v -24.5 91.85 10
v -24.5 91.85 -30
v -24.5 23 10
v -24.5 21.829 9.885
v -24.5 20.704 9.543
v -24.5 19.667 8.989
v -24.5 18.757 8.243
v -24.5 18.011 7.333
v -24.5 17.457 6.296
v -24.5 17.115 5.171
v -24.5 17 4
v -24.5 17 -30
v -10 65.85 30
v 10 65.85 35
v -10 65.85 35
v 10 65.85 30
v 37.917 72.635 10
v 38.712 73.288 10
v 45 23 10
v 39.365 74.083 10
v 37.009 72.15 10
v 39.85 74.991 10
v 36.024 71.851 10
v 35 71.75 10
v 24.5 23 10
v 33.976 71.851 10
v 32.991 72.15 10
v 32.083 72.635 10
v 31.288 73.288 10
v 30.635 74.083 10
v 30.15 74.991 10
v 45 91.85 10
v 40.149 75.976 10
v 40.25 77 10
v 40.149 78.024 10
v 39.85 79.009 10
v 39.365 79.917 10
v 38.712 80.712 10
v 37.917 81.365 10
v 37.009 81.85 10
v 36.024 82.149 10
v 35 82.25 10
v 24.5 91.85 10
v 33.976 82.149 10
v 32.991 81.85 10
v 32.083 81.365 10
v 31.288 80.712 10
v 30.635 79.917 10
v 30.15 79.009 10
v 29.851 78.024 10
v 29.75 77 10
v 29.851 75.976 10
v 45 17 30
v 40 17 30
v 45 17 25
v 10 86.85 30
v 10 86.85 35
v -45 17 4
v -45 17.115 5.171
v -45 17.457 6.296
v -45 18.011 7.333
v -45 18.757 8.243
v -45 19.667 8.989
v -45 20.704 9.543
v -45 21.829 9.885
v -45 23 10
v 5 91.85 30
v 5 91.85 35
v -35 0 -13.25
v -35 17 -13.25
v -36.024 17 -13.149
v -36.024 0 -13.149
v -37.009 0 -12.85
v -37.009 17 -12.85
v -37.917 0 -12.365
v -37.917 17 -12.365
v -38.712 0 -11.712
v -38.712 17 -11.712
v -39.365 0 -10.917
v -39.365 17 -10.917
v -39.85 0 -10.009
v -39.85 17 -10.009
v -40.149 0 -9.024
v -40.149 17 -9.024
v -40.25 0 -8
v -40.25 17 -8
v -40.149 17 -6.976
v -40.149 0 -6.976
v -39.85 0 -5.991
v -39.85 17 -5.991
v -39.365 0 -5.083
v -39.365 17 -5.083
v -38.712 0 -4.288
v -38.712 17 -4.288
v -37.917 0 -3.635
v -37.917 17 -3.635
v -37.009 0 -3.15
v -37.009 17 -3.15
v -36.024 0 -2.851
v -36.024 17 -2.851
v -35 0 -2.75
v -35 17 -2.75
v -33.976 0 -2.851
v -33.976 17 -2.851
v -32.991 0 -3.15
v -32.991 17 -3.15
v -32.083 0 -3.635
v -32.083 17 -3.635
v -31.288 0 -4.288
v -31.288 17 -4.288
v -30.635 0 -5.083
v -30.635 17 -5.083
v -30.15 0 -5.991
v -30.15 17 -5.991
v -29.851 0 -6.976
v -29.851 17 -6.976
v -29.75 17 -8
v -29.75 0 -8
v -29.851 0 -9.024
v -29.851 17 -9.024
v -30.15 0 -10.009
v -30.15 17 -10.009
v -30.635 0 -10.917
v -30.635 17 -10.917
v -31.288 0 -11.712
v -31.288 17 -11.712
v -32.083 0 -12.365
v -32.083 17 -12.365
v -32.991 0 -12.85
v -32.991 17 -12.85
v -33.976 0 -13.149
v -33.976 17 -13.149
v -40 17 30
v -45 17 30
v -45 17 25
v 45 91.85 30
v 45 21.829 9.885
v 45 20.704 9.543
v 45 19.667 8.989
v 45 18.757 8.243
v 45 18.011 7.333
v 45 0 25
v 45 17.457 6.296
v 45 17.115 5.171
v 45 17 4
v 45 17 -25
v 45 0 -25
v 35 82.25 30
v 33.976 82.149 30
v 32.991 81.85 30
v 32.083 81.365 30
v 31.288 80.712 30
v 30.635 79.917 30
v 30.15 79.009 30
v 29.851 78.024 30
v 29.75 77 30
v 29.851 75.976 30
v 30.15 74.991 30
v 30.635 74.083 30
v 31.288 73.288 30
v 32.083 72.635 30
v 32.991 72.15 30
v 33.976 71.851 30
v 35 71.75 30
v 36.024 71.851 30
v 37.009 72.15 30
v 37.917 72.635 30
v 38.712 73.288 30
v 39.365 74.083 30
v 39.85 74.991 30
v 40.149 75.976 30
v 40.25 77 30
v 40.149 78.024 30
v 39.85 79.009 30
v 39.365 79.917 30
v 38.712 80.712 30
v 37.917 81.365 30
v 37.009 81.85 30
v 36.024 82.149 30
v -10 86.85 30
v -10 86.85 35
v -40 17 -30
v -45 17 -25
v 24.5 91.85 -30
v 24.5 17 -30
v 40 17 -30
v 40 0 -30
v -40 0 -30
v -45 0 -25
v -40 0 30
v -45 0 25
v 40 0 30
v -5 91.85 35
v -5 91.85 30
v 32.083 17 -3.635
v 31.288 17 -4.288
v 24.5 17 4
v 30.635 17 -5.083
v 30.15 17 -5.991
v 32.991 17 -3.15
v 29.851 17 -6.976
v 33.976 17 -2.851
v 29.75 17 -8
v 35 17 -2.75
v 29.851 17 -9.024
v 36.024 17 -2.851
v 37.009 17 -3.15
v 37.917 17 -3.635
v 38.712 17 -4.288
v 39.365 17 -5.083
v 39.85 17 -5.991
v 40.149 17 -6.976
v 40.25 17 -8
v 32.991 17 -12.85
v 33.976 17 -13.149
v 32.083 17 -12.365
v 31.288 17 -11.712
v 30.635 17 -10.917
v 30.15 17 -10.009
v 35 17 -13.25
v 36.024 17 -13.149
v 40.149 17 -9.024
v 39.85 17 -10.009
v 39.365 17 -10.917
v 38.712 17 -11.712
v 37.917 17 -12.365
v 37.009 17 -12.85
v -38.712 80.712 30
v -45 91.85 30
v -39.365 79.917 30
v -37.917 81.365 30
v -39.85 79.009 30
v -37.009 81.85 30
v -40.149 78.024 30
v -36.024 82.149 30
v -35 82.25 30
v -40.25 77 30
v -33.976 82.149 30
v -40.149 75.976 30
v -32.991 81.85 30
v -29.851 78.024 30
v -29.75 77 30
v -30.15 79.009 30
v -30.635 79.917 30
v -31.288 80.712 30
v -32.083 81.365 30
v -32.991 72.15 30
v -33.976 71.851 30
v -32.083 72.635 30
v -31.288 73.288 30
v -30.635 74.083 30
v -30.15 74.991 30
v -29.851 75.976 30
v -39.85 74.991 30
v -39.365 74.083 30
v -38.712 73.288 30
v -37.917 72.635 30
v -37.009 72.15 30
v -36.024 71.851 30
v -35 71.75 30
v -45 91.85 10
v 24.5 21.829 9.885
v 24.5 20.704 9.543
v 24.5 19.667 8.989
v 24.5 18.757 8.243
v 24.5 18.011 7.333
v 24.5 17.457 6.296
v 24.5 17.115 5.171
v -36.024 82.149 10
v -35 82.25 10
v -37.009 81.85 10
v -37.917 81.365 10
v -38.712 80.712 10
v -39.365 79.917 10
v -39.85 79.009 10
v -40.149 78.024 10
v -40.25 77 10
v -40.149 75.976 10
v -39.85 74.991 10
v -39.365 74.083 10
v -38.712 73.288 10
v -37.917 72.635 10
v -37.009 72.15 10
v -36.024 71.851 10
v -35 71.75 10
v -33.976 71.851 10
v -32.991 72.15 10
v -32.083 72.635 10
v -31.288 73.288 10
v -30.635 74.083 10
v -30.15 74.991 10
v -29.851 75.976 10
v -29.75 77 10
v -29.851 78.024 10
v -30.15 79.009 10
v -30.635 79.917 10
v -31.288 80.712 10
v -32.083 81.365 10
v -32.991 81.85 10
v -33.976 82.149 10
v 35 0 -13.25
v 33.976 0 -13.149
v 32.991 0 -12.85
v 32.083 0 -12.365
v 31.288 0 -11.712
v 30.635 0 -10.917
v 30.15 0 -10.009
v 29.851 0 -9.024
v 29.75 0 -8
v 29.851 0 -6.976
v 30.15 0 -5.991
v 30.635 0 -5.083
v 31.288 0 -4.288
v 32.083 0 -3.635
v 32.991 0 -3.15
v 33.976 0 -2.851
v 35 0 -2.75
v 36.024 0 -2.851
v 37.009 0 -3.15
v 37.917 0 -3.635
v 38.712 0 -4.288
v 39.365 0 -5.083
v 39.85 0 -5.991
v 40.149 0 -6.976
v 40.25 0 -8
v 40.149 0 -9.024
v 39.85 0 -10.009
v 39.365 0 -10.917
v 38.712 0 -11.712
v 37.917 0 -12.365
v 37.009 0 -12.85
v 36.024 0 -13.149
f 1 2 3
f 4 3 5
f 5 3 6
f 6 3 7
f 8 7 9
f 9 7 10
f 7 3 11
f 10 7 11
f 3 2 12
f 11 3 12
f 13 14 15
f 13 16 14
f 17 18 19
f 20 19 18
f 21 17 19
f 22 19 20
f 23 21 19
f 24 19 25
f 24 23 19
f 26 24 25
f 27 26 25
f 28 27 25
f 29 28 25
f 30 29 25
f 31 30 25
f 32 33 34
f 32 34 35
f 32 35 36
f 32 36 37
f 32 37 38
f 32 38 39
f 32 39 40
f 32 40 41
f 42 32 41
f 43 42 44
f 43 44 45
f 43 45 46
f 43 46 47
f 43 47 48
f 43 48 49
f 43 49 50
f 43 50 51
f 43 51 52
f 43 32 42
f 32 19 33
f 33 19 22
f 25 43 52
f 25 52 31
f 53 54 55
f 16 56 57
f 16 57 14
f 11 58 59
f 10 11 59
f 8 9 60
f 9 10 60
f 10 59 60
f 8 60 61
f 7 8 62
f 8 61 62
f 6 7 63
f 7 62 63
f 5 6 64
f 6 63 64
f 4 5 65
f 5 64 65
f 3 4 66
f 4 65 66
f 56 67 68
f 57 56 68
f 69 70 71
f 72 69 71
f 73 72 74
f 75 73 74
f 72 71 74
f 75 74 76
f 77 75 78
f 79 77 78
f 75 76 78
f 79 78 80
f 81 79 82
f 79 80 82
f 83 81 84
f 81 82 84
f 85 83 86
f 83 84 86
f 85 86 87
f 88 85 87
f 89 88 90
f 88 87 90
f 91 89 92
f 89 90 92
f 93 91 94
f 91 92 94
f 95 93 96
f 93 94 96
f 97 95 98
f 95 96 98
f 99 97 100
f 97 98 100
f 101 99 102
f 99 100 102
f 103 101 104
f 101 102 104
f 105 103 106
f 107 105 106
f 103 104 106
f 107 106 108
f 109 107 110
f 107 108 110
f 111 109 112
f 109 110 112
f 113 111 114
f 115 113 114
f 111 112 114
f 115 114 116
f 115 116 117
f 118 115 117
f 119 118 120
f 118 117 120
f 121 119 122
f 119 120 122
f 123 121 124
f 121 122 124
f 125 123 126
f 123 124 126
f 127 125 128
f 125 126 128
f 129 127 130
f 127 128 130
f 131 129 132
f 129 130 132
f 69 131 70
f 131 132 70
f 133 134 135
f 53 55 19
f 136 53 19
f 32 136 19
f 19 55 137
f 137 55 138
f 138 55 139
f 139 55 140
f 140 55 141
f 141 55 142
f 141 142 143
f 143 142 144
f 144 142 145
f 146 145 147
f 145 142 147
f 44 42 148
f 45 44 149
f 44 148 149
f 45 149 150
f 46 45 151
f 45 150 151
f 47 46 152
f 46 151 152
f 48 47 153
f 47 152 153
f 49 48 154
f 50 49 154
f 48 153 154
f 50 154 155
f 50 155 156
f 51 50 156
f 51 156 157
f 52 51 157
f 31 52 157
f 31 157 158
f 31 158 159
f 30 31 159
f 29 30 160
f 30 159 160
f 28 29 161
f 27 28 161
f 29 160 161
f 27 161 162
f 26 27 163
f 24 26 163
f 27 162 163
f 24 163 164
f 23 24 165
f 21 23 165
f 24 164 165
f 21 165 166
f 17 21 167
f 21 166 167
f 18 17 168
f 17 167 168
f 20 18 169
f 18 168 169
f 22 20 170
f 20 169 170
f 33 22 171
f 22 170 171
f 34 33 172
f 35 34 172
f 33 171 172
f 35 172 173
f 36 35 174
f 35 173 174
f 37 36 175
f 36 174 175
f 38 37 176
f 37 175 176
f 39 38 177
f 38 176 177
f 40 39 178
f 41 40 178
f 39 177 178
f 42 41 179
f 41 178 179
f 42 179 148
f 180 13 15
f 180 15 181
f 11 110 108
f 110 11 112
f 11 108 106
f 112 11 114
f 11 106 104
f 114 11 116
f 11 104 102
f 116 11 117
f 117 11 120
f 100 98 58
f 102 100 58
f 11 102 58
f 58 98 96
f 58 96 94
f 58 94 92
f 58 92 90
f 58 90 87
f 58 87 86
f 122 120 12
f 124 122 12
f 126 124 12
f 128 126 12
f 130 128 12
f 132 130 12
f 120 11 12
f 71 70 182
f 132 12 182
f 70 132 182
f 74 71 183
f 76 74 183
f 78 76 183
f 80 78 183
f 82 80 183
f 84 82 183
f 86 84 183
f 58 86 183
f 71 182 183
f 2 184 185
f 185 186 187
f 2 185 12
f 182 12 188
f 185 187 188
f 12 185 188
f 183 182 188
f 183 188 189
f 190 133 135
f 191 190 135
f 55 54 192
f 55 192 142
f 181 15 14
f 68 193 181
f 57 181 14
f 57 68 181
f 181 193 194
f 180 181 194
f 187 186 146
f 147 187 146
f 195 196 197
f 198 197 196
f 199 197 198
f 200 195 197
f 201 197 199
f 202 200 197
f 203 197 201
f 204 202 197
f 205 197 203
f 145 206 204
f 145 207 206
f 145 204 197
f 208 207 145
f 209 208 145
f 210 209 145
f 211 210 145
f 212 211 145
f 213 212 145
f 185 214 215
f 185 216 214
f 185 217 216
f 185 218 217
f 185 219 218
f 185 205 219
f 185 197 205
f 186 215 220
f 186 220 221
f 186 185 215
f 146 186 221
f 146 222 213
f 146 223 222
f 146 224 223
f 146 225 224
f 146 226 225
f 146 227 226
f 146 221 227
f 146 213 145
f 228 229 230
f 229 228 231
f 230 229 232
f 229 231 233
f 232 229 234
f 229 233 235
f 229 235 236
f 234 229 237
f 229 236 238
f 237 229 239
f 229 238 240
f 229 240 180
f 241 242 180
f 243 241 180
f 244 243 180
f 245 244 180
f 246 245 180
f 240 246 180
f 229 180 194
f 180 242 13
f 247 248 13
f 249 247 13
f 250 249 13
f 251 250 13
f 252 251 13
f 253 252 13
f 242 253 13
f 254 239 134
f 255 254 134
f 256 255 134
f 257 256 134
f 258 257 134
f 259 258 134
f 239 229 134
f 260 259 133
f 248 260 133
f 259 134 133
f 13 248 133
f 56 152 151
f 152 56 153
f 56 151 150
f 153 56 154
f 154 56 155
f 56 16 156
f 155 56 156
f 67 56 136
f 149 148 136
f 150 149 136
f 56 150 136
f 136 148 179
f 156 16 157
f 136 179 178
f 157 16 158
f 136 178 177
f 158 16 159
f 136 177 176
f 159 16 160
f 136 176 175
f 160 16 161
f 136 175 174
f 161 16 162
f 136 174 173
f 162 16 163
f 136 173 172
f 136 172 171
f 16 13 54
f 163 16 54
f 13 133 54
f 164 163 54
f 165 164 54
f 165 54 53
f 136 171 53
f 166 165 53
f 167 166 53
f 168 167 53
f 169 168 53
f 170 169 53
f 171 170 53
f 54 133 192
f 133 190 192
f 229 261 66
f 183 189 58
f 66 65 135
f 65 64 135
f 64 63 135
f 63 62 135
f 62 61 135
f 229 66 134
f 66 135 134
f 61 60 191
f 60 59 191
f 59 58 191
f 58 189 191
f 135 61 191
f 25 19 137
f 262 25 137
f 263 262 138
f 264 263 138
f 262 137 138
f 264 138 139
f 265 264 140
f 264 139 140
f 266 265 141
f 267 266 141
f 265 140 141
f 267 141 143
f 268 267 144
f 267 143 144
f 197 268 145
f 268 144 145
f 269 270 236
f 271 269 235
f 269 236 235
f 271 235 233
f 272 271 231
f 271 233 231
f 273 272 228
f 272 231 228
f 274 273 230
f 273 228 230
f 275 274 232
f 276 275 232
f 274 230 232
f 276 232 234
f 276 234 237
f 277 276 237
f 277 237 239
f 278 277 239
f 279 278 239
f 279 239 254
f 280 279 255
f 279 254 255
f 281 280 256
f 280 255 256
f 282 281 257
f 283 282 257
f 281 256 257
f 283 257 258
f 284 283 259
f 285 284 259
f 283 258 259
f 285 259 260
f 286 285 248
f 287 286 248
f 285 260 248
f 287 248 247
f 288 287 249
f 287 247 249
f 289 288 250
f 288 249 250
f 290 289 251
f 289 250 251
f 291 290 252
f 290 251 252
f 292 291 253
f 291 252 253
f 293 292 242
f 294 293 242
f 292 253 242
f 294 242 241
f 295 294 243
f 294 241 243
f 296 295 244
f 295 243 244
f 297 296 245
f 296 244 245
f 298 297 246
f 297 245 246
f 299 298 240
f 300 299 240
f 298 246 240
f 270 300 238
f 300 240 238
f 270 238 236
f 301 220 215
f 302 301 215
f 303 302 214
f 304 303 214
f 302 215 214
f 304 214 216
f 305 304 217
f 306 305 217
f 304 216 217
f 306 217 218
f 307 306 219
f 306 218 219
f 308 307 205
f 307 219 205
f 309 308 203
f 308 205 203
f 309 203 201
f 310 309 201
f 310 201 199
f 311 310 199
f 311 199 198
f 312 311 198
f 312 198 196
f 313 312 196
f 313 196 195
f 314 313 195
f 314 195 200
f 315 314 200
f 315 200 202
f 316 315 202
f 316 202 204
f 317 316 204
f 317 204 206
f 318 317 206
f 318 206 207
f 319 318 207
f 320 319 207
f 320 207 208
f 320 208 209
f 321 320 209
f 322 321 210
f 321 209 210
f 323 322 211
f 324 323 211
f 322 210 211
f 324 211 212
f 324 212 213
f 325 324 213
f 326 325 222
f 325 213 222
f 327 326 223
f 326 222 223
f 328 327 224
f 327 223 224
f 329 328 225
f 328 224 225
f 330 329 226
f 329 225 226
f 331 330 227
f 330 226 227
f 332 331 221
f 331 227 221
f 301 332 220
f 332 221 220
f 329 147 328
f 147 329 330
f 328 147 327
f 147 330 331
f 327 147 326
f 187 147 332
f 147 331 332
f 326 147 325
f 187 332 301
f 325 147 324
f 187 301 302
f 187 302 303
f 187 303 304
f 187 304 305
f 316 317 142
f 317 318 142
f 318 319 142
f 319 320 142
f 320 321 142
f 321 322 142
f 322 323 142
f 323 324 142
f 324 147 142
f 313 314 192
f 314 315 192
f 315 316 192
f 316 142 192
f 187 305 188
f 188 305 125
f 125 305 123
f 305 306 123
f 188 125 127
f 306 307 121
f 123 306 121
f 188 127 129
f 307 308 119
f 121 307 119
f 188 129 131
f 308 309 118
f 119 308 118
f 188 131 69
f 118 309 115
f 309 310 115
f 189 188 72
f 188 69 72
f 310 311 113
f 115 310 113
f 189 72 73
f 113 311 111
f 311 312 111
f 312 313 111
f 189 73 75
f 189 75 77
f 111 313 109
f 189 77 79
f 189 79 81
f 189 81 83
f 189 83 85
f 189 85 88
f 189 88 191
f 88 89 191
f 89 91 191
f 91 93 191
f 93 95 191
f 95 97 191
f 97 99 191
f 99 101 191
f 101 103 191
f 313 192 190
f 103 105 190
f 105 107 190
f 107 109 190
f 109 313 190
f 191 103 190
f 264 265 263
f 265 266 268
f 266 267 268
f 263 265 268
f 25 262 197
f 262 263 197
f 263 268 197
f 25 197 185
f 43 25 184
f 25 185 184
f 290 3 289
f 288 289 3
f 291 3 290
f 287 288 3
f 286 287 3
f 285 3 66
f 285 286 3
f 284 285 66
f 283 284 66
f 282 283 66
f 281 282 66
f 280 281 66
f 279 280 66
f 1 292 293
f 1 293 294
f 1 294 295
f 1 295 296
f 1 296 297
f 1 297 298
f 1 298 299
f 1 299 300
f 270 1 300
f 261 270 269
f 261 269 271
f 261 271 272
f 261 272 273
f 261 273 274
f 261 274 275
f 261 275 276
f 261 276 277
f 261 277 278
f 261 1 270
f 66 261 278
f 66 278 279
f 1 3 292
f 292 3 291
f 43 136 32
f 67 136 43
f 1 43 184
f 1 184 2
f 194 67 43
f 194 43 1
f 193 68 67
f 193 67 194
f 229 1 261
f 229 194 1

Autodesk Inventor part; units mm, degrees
ref_plane "YZ Plane" through (0, 0, 0) normal (1, 0, 0) x (0, 1, 0)
ref_plane "XZ Plane" through (0, 0, 0) normal (0, 1, 0) x (-1, 0, 0)
ref_plane "XY Plane" through (0, 0, 0) normal (0, 0, 1) x (1, 0, 0)
sketch "Sketch5" plane through (0, 0, 0) normal (0, 1, 0) x (-1, 0, 0)
  line L0 (45, 30) -> (-45, 30)
  line L1 (-45, 30) -> (-45, -30)
  line L2 (-45, -30) -> (45, -30)
  line L3 (45, -30) -> (45, 30)
  point P0 (0, 0)
  point P1 (0, 30)
  point P2 (45, 0)
  dimension "d8" = 90
  dimension "d9" = 60
extrude "Extrusion5" add sketch "Sketch5" along normal blind 91.85
sketch "Sketch6" plane through (-45, 0, 30) normal (0, 0, 1) x (1, 0, 0)
  line L0 (0, 0) -> (90, 0) projected
  line L1 (0, 91.85) -> (90, 91.85) projected
  line L2 (35, 91.85) -> (55, 91.85)
  line L3 (55, 91.85) -> (55, 65.85)
  line L4 (55, 65.85) -> (35, 65.85)
  line L5 (35, 65.85) -> (35, 91.85)
  point P0 (45, 0)
  point P1 (45, 65.85)
  point P2 (45, 0)
  dimension "d12" = 26
  dimension "d13" = 20
extrude "Extrusion6" add sketch "Sketch6" along normal blind 5
chamfer "Chamfer2" distance 5 angle 45 2 edges at (10, 91.85, 32.5) (-10, 91.85, 32.5)
sketch "Sketch8" plane through (45, 0, -30) normal (0, 0, -1) x (-1, 0, 0)
  line L0 (0, 0) -> (90, 0) projected
  line L1 (90, 0) -> (90, 91.85) projected
  line L2 (0, 91.85) -> (90, 91.85) projected
  line L3 (0, 0) -> (0, 91.85) projected
  line L4 (20.5, 17) -> (20.5, 91.85)
  line L5 (45, 0) -> (45, 11.253)
  line L6 (45, 91.85) -> (45, 84.4514)
  line L7 (69.5, 91.85) -> (69.5, 17)
  line L8 (77.5, 17) -> (90, 17)
  line L9 (77.5, 17) -> (69.5, 17)
  line L10 (20.5, 17) -> (0, 17)
  point P0 (20.5, 25)
  point P1 (12.5, 17)
  point P2 (69.5, 25)
  dimension "d42" = 90
extrude "Extrusion7" cut sketch "Sketch8" against normal blind 40 contours L3 L2 L4 L10 | L8 L9 L7 L2 L1
sketch "Sketch9" plane through (45, 0, 10) normal (0, 0, -1) x (-1, 0, 0)
  circle A0 centre (10, 77) radius 5
  circle A1 centre (80, 77) radius 5
  line L0 (0, 0) -> (90, 0) projected
  line L1 (0, 17) -> (0, 91.85) projected
  circle A2 centre (10, 77) radius 10
  line L2 (0, 91.85) -> (90, 91.85)
  line L3 (45, 91.85) -> (45, 95.8754) construction
  line L4 (20.5, 91.85) -> (20.5, 17) construction
  point P0 (45, 0)
  dimension "d47" = 10
  dimension "d56" = 70
  dimension "d58" = 77
  dimension "d61" = 20
  dimension "d62" = 35
  dimension "d63" = 20.5
hole "Hole2" at (-35, 77, 10) at (35, 77, 10) direction (0, 0, 1) diameter 10.5 end through all
fillet "Fillet3" radius 6 2 edges at (34.75, 17, 10) (-34.75, 17, 10)
sketch "Sketch11" plane through (0, 0, 0) normal (0, -1, 0) x (1, 0, 0)
  line L0 (45, -30) -> (-45, -30) projected
  circle A0 centre (-35, -8) radius 5.25
  circle A1 centre (35, -8) radius 5.25
  circle A2 centre (-35, -8) radius 10
  line L1 (-24.5, 4) -> (-45, 4) projected
  point P0 (0, 0)
  dimension "d64" = 70
  dimension "d65" = 10.5
  dimension "d66" = 20
  dimension "d67" = 22
  dimension "d75" = 35
  dimension "d76" = 34
hole "Hole3" at (-35, 0, -8) at (35, 0, -8) direction (0, 1, 0) diameter 10.5 end through all
sketch "Sketch12" plane through (0, 0, 0) normal (0, -1, 0) x (1, 0, 0)
  line L0 (45, 30) -> (40, 30)
  line L1 (45, 25) -> (45, 30)
  line L2 (40, 30) -> (45, 25)
  line L3 (0, 0) -> (-5.6727, 0)
  line L4 (0, 0) -> (0, 4.9012)
  line L5 (45, -30) -> (40, -30)
  line L6 (45, -25) -> (45, -30)
  line L7 (40, -30) -> (45, -25)
  line L8 (-45, 30) -> (-40, 30)
  line L9 (-45, 25) -> (-45, 30)
  line L10 (-40, 30) -> (-45, 25)
  line L11 (-45, -30) -> (-40, -30)
  line L12 (-45, -25) -> (-45, -30)
  line L13 (-40, -30) -> (-45, -25)
  dimension "d80" = 5
  dimension "d81" = 5
extrude "Extrusion8" cut sketch "Sketch12" against normal up to surface (17 mm away) from surface at 0
equation "\"d62\" = 0.5 * d56"
equation "\"d75\" = 0.5 * d64"
properties part number "BC-10019-A" material "Alumínio 7075"
